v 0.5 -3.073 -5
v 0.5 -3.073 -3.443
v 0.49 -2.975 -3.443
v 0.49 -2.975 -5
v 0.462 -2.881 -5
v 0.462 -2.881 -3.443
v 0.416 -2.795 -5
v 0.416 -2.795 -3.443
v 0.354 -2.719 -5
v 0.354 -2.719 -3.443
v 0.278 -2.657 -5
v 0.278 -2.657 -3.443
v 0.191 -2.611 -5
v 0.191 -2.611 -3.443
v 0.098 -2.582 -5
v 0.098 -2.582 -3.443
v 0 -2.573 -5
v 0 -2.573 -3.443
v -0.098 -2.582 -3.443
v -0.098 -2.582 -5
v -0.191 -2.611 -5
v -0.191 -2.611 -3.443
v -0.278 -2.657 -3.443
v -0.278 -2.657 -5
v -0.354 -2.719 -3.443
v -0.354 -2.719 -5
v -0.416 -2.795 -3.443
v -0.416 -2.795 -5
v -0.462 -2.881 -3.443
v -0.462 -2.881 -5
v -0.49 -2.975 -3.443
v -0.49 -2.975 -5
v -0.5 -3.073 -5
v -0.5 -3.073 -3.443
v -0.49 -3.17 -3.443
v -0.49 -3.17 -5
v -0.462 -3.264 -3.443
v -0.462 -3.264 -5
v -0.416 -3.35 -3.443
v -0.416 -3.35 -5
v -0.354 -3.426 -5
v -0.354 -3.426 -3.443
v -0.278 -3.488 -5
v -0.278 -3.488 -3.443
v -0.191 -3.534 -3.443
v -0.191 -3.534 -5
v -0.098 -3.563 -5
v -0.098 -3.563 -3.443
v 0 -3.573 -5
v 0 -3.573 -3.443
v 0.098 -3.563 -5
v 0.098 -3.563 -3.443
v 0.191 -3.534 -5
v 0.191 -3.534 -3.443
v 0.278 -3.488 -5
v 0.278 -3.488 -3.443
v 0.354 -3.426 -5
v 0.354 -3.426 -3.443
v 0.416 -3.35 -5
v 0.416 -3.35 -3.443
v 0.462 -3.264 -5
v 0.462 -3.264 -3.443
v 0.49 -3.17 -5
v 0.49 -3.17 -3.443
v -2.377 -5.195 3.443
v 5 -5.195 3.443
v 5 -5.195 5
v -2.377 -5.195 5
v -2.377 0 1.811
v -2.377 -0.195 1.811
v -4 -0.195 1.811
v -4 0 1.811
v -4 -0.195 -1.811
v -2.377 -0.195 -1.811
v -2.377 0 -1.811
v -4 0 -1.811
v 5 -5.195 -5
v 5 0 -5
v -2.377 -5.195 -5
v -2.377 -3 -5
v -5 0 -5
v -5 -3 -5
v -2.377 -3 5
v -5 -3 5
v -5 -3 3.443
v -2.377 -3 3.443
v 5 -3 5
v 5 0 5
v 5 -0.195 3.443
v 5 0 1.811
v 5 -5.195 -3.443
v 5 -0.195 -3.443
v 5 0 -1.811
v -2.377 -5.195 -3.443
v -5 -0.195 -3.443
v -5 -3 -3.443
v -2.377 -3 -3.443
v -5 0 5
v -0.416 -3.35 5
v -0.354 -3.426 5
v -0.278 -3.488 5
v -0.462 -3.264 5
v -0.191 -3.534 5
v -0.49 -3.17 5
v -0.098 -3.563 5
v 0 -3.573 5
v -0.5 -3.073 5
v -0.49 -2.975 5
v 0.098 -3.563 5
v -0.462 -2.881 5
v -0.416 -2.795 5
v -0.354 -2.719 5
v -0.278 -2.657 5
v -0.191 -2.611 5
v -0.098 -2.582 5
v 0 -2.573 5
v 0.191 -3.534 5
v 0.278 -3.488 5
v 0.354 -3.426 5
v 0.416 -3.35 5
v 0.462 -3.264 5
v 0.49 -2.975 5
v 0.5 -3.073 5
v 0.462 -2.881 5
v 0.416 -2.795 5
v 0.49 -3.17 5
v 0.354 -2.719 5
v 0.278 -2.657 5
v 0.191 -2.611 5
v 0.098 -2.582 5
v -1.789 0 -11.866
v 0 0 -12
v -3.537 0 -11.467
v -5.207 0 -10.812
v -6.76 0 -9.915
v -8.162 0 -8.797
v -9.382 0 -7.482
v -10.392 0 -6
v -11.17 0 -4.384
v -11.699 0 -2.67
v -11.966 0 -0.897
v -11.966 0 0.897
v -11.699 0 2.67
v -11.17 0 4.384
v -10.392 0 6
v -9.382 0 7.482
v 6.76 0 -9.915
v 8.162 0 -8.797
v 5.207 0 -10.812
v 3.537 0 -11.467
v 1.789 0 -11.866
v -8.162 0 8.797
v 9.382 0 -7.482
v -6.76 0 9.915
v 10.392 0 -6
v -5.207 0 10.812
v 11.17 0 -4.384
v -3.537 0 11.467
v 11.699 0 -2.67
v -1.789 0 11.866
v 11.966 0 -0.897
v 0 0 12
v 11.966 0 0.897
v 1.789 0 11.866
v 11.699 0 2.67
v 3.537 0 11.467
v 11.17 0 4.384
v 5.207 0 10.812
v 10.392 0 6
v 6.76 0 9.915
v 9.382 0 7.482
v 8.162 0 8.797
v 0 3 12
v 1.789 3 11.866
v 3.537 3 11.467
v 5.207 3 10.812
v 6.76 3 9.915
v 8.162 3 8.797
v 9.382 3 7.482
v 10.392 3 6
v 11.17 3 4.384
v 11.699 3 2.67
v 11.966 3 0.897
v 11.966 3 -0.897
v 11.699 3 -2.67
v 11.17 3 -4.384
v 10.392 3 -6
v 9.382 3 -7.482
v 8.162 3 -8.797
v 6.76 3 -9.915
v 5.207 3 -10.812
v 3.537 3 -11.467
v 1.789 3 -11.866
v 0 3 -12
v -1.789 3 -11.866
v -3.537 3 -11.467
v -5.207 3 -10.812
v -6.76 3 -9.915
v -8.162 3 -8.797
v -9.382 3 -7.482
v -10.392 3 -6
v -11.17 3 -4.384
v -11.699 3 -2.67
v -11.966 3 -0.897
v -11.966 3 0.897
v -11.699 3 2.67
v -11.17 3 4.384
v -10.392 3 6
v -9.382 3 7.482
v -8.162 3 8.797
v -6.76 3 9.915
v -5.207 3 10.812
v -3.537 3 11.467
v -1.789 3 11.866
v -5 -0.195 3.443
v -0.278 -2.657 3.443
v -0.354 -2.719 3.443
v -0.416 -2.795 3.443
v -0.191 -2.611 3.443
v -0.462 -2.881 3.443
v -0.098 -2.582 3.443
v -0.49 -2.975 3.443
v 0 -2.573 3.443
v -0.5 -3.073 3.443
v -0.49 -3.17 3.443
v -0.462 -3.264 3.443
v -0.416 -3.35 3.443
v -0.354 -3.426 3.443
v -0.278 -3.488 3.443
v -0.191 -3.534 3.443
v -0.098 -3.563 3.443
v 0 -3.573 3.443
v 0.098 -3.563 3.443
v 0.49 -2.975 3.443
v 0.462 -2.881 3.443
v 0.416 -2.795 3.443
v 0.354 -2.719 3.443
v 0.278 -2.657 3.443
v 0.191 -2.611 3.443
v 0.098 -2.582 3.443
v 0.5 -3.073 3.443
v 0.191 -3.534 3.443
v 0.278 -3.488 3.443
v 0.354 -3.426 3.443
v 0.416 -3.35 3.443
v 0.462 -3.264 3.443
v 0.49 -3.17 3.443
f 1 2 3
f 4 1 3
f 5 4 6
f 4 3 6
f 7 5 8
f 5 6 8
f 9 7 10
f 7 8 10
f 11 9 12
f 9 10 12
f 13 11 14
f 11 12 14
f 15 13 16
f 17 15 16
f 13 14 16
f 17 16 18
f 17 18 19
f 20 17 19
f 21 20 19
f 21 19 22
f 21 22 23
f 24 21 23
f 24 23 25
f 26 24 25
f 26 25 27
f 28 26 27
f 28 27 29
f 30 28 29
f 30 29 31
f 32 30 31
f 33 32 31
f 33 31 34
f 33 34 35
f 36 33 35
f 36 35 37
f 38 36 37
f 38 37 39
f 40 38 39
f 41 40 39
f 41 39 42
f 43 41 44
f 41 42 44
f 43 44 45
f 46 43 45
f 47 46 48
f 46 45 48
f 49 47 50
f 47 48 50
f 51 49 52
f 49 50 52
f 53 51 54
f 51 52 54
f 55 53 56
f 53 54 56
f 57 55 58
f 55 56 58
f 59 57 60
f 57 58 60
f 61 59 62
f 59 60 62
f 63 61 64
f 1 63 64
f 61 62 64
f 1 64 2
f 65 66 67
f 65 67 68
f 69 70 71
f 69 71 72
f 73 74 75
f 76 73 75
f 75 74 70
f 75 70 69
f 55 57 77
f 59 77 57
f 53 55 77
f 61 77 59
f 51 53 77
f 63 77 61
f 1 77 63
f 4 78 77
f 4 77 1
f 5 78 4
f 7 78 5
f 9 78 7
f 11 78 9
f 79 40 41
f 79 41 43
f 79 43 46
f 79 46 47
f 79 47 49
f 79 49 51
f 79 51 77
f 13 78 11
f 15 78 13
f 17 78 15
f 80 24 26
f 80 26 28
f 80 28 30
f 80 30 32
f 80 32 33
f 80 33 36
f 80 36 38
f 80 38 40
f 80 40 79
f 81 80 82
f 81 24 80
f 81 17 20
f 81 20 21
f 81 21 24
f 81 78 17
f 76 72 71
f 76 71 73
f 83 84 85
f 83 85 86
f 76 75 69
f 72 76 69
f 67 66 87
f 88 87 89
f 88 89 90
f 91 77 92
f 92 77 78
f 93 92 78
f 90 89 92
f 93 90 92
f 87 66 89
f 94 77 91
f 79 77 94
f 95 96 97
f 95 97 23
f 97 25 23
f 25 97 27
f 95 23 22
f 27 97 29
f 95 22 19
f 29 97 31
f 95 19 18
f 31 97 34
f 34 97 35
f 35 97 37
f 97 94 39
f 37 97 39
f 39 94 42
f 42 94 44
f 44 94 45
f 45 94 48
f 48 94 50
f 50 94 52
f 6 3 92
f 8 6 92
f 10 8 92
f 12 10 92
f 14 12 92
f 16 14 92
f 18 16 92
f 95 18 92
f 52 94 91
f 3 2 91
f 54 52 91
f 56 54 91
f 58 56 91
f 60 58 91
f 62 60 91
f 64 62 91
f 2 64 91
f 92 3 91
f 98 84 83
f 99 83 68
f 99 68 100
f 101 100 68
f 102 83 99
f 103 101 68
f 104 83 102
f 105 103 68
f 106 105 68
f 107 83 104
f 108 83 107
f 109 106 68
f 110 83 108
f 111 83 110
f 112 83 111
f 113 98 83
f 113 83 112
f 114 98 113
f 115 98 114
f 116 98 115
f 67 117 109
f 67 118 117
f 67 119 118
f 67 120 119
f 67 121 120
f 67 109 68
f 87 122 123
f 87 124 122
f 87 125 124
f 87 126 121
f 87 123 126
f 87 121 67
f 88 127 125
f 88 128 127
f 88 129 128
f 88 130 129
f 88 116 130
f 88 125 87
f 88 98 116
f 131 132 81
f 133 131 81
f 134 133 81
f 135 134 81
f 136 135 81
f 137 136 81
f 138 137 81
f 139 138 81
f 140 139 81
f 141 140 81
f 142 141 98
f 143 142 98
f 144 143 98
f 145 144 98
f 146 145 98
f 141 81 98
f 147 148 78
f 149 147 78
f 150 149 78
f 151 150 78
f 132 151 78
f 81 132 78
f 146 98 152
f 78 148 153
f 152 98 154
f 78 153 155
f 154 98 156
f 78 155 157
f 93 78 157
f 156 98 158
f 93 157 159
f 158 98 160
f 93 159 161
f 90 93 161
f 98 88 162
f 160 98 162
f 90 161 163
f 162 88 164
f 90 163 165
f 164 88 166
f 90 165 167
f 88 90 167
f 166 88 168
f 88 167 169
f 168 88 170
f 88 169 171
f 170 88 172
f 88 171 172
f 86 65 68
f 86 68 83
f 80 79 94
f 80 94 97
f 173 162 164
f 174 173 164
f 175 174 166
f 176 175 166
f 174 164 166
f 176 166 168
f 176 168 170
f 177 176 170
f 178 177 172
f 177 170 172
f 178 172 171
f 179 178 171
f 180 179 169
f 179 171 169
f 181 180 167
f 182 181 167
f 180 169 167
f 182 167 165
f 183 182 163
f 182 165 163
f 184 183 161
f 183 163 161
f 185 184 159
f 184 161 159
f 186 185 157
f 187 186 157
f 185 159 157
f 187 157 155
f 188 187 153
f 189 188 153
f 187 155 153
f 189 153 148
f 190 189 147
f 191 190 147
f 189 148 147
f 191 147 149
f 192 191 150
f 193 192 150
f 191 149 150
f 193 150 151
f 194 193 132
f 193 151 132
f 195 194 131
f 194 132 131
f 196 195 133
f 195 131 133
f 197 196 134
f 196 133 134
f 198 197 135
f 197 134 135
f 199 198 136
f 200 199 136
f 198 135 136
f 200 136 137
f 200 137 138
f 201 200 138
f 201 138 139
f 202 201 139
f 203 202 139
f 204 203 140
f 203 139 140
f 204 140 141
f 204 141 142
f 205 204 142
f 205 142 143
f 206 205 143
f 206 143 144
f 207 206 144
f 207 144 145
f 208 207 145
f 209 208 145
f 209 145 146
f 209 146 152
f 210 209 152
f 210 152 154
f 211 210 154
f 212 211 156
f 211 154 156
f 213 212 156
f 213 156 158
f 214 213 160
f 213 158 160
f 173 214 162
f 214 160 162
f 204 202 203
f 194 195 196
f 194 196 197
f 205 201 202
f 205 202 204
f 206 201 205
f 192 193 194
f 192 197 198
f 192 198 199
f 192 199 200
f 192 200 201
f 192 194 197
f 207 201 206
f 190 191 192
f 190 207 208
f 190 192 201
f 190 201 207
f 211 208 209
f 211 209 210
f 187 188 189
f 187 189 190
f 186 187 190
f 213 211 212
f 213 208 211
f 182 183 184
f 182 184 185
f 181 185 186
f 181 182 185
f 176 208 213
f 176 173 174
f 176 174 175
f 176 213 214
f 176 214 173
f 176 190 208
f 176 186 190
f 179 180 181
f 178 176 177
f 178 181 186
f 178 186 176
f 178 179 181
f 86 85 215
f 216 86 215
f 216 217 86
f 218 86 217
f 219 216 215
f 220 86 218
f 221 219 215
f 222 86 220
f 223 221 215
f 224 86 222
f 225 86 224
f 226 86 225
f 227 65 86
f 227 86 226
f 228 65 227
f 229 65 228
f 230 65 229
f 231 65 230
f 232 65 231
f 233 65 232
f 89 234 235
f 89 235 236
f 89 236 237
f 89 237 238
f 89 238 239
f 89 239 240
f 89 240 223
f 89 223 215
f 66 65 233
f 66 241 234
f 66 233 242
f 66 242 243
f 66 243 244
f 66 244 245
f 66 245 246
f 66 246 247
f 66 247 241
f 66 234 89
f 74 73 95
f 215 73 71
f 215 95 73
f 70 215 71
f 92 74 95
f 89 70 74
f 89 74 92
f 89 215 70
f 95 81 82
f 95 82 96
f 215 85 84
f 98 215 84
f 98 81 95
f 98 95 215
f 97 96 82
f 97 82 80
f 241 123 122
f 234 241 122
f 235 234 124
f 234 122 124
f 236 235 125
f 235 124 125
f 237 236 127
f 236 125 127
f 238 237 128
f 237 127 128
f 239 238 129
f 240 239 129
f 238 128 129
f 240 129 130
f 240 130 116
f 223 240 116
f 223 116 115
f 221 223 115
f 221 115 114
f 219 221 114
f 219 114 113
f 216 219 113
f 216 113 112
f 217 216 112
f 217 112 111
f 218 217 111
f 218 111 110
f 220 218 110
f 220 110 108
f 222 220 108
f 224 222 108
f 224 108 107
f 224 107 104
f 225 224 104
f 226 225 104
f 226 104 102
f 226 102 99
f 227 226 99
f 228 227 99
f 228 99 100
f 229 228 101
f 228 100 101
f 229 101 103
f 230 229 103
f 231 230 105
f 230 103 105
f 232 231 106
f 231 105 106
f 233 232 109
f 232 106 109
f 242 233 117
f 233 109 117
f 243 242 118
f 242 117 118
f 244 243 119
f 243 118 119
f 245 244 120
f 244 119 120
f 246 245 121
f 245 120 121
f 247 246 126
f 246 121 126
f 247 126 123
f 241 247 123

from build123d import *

# Parameters (mm, degrees)
SKETCH1_R           = 12
BOSS_EXTRUDE1_DEPTH = 3
SKETCH3_W           = 10
SKETCH3_H           = 10
BOSS_EXTRUDE3_DEPTH = 3
SKETCH4_R           = 0.5
CUT_EXTRUDE1_DEPTH  = 9
SKETCH5_W           = 3.622801716
SKETCH5_H           = 3
CUT_EXTRUDE2_DEPTH  = 9
BOSS_EXTRUDE5_REACH = 23.024
SKETCH6_W           = 7.376723675
SKETCH6_H           = 5.195198294
SKETCH7_R           = 0.5
CUT_EXTRUDE3_DEPTH  = 14
SKETCH8_W           = 3.773751788
SKETCH8_H           = 4.487553498
CUT_EXTRUDE4_DEPTH  = 22.447379451
SKETCH9_W           = 10
SKETCH9_H           = 6.886875894
CUT_EXTRUDE5_DEPTH  = 5


with BuildPart() as part:
    # Sketch1 → Boss-Extrude1 (new body)
    with BuildSketch(Plane(origin=(0, 0, 0), x_dir=(1, 0, 0), z_dir=(0, 1, 0))):
        with Locations(Location((0, 0, 0), (0, 0, 270))):
            Circle(SKETCH1_R)
    extrude(amount=BOSS_EXTRUDE1_DEPTH)

    # Sketch3 → Boss-Extrude3 (add)
    with BuildSketch(Plane.XZ):
        Rectangle(SKETCH3_W, SKETCH3_H)
    extrude(amount=BOSS_EXTRUDE3_DEPTH)

    # Sketch4 → Cut-Extrude1 (cut)
    with BuildSketch(Plane(origin=(0, 0, -5), x_dir=(-1, 0, 0), z_dir=(0, 0, -1))):
        with Locations((0, -1.5)):
            Circle(SKETCH4_R)
    extrude(amount=-CUT_EXTRUDE1_DEPTH, mode=Mode.SUBTRACT)

    # Sketch5 → Cut-Extrude2 (cut)
    with BuildSketch(Plane(origin=(5, 0, 0), x_dir=(0, 0, -1), z_dir=(1, 0, 0))):
        with Locations((0, -1.5)):
            Rectangle(SKETCH5_W, SKETCH5_H)
    extrude(amount=-CUT_EXTRUDE2_DEPTH, mode=Mode.SUBTRACT)

    # Boss-Extrude5: up to this face of the body (flat: up to its plane)
    boss_extrude5_end = Plane(part.part.faces().sort_by_distance((0, -1.5, 5))[0])
    # Sketch6 → Boss-Extrude5 (add, up to the picked face)
    with BuildSketch(Plane(origin=(0, 0, -5), x_dir=(-1, 0, 0), z_dir=(0, 0, -1)), mode=Mode.PRIVATE) as boss_extrude5_sk1:
        with Locations((-1.311638162, -2.597599147)):
            Rectangle(SKETCH6_W, SKETCH6_H)
    boss_extrude5_tool1 = split(extrude(boss_extrude5_sk1.sketch, amount=-BOSS_EXTRUDE5_REACH, mode=Mode.PRIVATE), bisect_by=boss_extrude5_end, keep=Keep.BOTH, mode=Mode.PRIVATE)
    add(boss_extrude5_tool1.solids().sort_by(Axis((1.311638, -2.597599, -5), (0, 0, 1)))[0])

    # Sketch7 → Cut-Extrude3 (cut)
    with BuildSketch(Plane.XY.offset(5)):
        with Locations((0, -3.072529249)):
            Circle(SKETCH7_R)
    extrude(amount=-CUT_EXTRUDE3_DEPTH, mode=Mode.SUBTRACT)

    # Sketch8 → Cut-Extrude4 (cut, through all)
    with BuildSketch(Plane.ZY.offset(5)):
        with Locations((0, -2.951421545)):
            Rectangle(SKETCH8_W, SKETCH8_H)
    extrude(amount=-CUT_EXTRUDE4_DEPTH, mode=Mode.SUBTRACT)

    # Sketch9 → Cut-Extrude5 (cut)
    with BuildSketch(Plane.XZ.offset(5.195198294)):
        Rectangle(SKETCH9_W, SKETCH9_H)
    extrude(amount=-CUT_EXTRUDE5_DEPTH, mode=Mode.SUBTRACT)


solid = part.part
